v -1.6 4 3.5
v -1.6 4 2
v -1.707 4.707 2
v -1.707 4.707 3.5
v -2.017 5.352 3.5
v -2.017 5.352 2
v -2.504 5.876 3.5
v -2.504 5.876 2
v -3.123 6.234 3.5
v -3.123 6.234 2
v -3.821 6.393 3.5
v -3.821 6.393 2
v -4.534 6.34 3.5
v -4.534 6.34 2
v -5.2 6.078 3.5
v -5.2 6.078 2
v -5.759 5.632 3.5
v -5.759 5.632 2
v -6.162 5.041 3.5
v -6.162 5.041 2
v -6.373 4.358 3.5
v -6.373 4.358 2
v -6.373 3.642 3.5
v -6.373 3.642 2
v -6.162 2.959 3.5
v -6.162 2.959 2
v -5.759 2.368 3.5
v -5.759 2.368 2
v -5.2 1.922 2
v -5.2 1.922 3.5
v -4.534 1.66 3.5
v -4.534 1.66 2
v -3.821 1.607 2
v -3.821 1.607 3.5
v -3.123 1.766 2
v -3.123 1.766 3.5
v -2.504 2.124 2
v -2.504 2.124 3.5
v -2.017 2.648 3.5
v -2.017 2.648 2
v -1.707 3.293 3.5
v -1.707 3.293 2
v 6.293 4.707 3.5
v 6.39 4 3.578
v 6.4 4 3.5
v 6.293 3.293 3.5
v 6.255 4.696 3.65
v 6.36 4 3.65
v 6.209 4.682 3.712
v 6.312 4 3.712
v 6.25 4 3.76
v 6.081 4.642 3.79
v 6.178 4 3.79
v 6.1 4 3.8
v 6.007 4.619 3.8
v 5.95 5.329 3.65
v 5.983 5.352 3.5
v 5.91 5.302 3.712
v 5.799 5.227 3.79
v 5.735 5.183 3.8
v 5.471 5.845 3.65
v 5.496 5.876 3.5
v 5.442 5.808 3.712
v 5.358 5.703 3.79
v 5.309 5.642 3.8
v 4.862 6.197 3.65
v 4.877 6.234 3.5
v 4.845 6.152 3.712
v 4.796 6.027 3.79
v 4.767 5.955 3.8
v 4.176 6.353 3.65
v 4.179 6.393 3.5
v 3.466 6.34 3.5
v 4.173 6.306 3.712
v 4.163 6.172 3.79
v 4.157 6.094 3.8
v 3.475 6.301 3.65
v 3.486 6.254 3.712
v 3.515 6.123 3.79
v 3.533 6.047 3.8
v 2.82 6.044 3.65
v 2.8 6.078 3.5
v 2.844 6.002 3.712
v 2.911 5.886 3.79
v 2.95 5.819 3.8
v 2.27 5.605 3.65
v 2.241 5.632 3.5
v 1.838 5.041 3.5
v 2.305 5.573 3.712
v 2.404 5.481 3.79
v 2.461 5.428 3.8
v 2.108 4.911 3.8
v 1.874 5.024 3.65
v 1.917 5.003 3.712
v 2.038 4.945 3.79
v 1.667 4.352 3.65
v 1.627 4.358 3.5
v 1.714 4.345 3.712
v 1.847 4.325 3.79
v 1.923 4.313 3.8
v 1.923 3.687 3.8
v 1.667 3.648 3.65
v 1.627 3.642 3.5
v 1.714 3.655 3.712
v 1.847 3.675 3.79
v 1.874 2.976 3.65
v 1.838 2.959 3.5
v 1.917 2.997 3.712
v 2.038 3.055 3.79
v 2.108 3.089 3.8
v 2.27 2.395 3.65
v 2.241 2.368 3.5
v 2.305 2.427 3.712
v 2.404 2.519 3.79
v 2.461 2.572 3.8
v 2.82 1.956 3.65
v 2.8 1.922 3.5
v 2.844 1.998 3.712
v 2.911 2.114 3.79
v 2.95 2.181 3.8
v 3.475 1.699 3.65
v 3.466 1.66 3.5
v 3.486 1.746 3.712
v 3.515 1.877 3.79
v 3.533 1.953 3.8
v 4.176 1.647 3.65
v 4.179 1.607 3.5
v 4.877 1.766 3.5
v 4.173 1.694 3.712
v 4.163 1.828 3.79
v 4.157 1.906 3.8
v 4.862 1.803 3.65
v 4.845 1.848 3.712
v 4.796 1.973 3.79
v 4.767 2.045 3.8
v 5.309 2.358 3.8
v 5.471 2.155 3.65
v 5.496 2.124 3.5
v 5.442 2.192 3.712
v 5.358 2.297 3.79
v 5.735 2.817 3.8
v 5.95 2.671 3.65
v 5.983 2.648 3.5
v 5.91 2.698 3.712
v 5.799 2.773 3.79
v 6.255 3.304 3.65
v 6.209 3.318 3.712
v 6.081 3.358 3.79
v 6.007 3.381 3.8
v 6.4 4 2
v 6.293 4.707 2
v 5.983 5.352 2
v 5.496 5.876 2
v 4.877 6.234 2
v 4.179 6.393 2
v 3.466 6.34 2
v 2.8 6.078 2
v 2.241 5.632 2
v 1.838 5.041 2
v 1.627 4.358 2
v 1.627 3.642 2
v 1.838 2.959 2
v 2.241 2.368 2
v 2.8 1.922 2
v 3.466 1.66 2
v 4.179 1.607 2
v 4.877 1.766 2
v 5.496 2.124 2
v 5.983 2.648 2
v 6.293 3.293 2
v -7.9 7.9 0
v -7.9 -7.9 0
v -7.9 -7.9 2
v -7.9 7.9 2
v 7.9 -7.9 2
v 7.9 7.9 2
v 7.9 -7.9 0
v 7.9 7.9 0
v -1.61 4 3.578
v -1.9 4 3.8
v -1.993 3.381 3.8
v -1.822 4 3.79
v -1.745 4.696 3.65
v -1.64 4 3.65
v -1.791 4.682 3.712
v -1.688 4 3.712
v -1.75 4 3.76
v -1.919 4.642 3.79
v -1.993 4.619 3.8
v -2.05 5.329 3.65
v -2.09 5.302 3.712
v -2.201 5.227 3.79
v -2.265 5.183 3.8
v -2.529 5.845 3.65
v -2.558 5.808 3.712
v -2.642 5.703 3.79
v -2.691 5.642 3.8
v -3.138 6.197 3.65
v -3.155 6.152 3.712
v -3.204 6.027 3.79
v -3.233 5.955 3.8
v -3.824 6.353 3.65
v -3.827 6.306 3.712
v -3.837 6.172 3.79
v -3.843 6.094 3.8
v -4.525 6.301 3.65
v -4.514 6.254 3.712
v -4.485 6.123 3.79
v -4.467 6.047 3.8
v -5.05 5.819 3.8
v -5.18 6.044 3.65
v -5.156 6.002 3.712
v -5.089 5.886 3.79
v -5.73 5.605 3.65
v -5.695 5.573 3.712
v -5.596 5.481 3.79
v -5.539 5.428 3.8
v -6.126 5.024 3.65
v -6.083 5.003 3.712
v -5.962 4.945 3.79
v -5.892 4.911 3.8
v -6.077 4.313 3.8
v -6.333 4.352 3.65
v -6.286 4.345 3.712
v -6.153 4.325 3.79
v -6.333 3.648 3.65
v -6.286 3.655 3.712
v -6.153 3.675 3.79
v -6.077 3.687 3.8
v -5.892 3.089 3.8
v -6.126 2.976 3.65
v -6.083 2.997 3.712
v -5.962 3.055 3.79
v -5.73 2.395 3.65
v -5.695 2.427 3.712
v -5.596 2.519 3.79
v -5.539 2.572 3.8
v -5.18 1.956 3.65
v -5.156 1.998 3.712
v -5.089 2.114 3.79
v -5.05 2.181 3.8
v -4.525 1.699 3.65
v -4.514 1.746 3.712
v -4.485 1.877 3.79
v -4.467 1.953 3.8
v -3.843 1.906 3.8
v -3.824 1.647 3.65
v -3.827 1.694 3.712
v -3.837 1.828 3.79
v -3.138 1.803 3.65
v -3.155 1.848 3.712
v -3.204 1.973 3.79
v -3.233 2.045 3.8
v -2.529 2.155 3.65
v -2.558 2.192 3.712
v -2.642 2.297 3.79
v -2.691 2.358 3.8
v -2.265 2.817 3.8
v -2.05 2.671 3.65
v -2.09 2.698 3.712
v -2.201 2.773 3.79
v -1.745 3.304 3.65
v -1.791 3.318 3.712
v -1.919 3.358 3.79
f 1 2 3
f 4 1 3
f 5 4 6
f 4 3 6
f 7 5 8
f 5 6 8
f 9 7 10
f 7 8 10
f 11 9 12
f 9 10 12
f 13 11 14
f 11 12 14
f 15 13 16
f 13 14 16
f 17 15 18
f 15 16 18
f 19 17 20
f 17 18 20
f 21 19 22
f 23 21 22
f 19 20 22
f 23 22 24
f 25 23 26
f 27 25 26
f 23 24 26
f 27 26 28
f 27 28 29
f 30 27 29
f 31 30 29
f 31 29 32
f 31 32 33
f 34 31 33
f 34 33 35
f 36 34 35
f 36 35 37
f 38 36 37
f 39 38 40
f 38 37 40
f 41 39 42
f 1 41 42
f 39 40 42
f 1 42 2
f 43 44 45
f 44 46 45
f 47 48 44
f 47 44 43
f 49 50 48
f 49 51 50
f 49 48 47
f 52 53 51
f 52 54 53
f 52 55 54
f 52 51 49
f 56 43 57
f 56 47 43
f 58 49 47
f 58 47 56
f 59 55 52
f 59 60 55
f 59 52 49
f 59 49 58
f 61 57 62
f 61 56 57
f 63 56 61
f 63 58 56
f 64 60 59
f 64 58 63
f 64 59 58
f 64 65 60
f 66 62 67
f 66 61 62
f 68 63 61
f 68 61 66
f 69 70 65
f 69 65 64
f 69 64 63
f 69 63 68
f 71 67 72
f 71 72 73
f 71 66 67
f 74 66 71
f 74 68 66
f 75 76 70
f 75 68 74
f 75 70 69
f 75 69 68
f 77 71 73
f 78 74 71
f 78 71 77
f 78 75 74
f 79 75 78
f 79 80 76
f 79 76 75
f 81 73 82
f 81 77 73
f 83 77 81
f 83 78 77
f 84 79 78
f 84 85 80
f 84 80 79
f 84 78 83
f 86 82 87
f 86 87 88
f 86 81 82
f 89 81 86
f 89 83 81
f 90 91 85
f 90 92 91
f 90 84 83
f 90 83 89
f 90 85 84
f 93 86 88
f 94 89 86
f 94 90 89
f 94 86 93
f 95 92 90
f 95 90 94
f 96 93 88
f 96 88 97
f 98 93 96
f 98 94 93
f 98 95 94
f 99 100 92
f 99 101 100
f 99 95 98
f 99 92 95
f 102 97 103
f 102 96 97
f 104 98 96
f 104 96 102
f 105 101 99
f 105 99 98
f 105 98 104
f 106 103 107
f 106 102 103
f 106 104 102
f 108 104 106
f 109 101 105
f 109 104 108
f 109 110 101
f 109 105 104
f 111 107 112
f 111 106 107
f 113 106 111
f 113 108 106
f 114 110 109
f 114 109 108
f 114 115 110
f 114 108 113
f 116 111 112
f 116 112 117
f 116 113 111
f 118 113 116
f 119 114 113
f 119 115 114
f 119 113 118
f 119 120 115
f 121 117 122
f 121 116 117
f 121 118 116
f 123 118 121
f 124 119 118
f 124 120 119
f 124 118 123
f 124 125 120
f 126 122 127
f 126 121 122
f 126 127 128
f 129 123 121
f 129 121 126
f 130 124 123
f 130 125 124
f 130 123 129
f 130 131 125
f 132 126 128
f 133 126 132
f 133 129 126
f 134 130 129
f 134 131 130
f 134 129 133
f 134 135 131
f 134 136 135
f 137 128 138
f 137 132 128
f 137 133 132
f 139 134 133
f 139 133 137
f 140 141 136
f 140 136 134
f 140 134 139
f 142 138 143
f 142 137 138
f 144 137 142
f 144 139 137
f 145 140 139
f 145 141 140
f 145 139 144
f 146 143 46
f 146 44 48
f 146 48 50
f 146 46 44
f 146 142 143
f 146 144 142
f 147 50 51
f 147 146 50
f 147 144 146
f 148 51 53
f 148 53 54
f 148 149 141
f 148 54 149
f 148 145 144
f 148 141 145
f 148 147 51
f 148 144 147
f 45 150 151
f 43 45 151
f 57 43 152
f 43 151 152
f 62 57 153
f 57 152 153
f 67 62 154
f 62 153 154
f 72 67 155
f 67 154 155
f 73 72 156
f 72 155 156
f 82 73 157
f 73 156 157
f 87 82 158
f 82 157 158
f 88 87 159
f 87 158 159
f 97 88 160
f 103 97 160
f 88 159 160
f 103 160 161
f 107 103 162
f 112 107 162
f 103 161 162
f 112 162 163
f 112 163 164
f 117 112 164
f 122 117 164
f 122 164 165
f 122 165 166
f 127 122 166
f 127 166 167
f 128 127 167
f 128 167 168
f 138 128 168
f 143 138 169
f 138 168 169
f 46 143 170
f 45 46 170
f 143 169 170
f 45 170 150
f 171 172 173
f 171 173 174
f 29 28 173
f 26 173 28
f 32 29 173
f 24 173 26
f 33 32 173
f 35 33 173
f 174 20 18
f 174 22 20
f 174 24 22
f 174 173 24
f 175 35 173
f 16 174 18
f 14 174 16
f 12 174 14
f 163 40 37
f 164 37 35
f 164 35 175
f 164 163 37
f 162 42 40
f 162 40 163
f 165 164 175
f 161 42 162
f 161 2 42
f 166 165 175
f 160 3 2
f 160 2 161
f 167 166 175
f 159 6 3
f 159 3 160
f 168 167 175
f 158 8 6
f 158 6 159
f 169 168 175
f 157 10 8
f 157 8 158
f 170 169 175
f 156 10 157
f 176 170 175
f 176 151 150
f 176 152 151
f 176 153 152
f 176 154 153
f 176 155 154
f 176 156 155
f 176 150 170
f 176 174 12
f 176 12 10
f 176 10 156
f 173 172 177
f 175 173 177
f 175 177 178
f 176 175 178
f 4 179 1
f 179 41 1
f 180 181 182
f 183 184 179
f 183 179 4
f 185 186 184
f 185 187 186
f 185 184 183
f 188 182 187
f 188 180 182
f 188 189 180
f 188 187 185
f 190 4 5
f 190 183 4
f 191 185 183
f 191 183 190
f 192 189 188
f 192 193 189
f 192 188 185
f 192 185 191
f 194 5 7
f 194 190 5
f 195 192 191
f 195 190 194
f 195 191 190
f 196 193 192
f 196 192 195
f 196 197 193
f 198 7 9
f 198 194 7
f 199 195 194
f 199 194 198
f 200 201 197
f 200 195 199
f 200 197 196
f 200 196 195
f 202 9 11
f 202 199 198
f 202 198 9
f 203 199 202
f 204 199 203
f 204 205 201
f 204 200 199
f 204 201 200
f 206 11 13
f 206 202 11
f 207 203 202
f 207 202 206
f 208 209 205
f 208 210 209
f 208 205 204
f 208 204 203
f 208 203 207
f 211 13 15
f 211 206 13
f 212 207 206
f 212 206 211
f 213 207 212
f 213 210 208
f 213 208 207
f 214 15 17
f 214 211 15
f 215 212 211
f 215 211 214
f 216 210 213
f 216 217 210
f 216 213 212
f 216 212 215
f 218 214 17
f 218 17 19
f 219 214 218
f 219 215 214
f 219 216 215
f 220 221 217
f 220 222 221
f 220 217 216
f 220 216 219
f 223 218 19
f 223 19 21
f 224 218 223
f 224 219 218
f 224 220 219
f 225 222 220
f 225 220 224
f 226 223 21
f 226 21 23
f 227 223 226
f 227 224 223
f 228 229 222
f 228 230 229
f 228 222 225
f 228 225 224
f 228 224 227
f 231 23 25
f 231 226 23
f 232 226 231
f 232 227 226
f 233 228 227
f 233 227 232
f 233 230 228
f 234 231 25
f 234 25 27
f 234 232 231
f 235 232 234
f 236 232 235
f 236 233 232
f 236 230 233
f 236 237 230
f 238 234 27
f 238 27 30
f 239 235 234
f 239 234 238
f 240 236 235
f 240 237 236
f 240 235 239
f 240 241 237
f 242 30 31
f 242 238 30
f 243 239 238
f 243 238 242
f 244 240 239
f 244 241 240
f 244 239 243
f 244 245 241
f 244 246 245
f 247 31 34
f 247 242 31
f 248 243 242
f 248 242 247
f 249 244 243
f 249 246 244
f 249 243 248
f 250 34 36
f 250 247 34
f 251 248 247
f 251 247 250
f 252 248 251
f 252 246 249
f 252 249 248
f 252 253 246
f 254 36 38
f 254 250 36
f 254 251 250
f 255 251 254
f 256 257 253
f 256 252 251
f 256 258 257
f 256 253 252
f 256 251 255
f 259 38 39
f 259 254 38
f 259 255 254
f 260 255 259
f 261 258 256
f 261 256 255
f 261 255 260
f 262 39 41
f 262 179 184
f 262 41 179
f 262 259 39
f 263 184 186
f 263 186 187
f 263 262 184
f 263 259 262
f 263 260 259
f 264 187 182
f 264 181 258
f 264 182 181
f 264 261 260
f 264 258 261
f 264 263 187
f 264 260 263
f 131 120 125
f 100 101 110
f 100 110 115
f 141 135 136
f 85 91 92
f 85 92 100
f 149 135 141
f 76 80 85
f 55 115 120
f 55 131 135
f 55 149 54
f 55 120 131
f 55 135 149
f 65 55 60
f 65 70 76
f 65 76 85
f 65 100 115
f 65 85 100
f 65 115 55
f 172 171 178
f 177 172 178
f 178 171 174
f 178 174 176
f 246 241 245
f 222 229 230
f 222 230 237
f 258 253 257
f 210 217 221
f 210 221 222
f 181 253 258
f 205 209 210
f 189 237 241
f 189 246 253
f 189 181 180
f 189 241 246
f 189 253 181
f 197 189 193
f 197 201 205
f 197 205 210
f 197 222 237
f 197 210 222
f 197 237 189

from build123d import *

# Parameters (mm, degrees)
F0_W     = 15.8
F0_H     = 15.8
F1_DEPTH = 2
F2_R     = 2.4
F3_DEPTH = 1.8
F4_R     = 0.3


with BuildPart() as f1:
    # F0 (on Top) → F1 (new body)
    with BuildSketch(Plane.XY):
        Rectangle(F0_W, F0_H)
    extrude(amount=F1_DEPTH)

    # F2 (on face) → F3 (join)
    with BuildSketch(Plane.XY.offset(2)):
        with Locations((-4, 4)):
            Circle(F2_R)
        with Locations((4, 4)):
            Circle(F2_R)
    extrude(amount=F3_DEPTH)

    # F4
    f4_edges = [f1.edges().sort_by_distance(p)[0] for p in [
        (1.6, 4, 3.8),
        (-6.4, 4, 3.8),
    ]]
    fillet(f4_edges, radius=F4_R)


solid = f1.part
